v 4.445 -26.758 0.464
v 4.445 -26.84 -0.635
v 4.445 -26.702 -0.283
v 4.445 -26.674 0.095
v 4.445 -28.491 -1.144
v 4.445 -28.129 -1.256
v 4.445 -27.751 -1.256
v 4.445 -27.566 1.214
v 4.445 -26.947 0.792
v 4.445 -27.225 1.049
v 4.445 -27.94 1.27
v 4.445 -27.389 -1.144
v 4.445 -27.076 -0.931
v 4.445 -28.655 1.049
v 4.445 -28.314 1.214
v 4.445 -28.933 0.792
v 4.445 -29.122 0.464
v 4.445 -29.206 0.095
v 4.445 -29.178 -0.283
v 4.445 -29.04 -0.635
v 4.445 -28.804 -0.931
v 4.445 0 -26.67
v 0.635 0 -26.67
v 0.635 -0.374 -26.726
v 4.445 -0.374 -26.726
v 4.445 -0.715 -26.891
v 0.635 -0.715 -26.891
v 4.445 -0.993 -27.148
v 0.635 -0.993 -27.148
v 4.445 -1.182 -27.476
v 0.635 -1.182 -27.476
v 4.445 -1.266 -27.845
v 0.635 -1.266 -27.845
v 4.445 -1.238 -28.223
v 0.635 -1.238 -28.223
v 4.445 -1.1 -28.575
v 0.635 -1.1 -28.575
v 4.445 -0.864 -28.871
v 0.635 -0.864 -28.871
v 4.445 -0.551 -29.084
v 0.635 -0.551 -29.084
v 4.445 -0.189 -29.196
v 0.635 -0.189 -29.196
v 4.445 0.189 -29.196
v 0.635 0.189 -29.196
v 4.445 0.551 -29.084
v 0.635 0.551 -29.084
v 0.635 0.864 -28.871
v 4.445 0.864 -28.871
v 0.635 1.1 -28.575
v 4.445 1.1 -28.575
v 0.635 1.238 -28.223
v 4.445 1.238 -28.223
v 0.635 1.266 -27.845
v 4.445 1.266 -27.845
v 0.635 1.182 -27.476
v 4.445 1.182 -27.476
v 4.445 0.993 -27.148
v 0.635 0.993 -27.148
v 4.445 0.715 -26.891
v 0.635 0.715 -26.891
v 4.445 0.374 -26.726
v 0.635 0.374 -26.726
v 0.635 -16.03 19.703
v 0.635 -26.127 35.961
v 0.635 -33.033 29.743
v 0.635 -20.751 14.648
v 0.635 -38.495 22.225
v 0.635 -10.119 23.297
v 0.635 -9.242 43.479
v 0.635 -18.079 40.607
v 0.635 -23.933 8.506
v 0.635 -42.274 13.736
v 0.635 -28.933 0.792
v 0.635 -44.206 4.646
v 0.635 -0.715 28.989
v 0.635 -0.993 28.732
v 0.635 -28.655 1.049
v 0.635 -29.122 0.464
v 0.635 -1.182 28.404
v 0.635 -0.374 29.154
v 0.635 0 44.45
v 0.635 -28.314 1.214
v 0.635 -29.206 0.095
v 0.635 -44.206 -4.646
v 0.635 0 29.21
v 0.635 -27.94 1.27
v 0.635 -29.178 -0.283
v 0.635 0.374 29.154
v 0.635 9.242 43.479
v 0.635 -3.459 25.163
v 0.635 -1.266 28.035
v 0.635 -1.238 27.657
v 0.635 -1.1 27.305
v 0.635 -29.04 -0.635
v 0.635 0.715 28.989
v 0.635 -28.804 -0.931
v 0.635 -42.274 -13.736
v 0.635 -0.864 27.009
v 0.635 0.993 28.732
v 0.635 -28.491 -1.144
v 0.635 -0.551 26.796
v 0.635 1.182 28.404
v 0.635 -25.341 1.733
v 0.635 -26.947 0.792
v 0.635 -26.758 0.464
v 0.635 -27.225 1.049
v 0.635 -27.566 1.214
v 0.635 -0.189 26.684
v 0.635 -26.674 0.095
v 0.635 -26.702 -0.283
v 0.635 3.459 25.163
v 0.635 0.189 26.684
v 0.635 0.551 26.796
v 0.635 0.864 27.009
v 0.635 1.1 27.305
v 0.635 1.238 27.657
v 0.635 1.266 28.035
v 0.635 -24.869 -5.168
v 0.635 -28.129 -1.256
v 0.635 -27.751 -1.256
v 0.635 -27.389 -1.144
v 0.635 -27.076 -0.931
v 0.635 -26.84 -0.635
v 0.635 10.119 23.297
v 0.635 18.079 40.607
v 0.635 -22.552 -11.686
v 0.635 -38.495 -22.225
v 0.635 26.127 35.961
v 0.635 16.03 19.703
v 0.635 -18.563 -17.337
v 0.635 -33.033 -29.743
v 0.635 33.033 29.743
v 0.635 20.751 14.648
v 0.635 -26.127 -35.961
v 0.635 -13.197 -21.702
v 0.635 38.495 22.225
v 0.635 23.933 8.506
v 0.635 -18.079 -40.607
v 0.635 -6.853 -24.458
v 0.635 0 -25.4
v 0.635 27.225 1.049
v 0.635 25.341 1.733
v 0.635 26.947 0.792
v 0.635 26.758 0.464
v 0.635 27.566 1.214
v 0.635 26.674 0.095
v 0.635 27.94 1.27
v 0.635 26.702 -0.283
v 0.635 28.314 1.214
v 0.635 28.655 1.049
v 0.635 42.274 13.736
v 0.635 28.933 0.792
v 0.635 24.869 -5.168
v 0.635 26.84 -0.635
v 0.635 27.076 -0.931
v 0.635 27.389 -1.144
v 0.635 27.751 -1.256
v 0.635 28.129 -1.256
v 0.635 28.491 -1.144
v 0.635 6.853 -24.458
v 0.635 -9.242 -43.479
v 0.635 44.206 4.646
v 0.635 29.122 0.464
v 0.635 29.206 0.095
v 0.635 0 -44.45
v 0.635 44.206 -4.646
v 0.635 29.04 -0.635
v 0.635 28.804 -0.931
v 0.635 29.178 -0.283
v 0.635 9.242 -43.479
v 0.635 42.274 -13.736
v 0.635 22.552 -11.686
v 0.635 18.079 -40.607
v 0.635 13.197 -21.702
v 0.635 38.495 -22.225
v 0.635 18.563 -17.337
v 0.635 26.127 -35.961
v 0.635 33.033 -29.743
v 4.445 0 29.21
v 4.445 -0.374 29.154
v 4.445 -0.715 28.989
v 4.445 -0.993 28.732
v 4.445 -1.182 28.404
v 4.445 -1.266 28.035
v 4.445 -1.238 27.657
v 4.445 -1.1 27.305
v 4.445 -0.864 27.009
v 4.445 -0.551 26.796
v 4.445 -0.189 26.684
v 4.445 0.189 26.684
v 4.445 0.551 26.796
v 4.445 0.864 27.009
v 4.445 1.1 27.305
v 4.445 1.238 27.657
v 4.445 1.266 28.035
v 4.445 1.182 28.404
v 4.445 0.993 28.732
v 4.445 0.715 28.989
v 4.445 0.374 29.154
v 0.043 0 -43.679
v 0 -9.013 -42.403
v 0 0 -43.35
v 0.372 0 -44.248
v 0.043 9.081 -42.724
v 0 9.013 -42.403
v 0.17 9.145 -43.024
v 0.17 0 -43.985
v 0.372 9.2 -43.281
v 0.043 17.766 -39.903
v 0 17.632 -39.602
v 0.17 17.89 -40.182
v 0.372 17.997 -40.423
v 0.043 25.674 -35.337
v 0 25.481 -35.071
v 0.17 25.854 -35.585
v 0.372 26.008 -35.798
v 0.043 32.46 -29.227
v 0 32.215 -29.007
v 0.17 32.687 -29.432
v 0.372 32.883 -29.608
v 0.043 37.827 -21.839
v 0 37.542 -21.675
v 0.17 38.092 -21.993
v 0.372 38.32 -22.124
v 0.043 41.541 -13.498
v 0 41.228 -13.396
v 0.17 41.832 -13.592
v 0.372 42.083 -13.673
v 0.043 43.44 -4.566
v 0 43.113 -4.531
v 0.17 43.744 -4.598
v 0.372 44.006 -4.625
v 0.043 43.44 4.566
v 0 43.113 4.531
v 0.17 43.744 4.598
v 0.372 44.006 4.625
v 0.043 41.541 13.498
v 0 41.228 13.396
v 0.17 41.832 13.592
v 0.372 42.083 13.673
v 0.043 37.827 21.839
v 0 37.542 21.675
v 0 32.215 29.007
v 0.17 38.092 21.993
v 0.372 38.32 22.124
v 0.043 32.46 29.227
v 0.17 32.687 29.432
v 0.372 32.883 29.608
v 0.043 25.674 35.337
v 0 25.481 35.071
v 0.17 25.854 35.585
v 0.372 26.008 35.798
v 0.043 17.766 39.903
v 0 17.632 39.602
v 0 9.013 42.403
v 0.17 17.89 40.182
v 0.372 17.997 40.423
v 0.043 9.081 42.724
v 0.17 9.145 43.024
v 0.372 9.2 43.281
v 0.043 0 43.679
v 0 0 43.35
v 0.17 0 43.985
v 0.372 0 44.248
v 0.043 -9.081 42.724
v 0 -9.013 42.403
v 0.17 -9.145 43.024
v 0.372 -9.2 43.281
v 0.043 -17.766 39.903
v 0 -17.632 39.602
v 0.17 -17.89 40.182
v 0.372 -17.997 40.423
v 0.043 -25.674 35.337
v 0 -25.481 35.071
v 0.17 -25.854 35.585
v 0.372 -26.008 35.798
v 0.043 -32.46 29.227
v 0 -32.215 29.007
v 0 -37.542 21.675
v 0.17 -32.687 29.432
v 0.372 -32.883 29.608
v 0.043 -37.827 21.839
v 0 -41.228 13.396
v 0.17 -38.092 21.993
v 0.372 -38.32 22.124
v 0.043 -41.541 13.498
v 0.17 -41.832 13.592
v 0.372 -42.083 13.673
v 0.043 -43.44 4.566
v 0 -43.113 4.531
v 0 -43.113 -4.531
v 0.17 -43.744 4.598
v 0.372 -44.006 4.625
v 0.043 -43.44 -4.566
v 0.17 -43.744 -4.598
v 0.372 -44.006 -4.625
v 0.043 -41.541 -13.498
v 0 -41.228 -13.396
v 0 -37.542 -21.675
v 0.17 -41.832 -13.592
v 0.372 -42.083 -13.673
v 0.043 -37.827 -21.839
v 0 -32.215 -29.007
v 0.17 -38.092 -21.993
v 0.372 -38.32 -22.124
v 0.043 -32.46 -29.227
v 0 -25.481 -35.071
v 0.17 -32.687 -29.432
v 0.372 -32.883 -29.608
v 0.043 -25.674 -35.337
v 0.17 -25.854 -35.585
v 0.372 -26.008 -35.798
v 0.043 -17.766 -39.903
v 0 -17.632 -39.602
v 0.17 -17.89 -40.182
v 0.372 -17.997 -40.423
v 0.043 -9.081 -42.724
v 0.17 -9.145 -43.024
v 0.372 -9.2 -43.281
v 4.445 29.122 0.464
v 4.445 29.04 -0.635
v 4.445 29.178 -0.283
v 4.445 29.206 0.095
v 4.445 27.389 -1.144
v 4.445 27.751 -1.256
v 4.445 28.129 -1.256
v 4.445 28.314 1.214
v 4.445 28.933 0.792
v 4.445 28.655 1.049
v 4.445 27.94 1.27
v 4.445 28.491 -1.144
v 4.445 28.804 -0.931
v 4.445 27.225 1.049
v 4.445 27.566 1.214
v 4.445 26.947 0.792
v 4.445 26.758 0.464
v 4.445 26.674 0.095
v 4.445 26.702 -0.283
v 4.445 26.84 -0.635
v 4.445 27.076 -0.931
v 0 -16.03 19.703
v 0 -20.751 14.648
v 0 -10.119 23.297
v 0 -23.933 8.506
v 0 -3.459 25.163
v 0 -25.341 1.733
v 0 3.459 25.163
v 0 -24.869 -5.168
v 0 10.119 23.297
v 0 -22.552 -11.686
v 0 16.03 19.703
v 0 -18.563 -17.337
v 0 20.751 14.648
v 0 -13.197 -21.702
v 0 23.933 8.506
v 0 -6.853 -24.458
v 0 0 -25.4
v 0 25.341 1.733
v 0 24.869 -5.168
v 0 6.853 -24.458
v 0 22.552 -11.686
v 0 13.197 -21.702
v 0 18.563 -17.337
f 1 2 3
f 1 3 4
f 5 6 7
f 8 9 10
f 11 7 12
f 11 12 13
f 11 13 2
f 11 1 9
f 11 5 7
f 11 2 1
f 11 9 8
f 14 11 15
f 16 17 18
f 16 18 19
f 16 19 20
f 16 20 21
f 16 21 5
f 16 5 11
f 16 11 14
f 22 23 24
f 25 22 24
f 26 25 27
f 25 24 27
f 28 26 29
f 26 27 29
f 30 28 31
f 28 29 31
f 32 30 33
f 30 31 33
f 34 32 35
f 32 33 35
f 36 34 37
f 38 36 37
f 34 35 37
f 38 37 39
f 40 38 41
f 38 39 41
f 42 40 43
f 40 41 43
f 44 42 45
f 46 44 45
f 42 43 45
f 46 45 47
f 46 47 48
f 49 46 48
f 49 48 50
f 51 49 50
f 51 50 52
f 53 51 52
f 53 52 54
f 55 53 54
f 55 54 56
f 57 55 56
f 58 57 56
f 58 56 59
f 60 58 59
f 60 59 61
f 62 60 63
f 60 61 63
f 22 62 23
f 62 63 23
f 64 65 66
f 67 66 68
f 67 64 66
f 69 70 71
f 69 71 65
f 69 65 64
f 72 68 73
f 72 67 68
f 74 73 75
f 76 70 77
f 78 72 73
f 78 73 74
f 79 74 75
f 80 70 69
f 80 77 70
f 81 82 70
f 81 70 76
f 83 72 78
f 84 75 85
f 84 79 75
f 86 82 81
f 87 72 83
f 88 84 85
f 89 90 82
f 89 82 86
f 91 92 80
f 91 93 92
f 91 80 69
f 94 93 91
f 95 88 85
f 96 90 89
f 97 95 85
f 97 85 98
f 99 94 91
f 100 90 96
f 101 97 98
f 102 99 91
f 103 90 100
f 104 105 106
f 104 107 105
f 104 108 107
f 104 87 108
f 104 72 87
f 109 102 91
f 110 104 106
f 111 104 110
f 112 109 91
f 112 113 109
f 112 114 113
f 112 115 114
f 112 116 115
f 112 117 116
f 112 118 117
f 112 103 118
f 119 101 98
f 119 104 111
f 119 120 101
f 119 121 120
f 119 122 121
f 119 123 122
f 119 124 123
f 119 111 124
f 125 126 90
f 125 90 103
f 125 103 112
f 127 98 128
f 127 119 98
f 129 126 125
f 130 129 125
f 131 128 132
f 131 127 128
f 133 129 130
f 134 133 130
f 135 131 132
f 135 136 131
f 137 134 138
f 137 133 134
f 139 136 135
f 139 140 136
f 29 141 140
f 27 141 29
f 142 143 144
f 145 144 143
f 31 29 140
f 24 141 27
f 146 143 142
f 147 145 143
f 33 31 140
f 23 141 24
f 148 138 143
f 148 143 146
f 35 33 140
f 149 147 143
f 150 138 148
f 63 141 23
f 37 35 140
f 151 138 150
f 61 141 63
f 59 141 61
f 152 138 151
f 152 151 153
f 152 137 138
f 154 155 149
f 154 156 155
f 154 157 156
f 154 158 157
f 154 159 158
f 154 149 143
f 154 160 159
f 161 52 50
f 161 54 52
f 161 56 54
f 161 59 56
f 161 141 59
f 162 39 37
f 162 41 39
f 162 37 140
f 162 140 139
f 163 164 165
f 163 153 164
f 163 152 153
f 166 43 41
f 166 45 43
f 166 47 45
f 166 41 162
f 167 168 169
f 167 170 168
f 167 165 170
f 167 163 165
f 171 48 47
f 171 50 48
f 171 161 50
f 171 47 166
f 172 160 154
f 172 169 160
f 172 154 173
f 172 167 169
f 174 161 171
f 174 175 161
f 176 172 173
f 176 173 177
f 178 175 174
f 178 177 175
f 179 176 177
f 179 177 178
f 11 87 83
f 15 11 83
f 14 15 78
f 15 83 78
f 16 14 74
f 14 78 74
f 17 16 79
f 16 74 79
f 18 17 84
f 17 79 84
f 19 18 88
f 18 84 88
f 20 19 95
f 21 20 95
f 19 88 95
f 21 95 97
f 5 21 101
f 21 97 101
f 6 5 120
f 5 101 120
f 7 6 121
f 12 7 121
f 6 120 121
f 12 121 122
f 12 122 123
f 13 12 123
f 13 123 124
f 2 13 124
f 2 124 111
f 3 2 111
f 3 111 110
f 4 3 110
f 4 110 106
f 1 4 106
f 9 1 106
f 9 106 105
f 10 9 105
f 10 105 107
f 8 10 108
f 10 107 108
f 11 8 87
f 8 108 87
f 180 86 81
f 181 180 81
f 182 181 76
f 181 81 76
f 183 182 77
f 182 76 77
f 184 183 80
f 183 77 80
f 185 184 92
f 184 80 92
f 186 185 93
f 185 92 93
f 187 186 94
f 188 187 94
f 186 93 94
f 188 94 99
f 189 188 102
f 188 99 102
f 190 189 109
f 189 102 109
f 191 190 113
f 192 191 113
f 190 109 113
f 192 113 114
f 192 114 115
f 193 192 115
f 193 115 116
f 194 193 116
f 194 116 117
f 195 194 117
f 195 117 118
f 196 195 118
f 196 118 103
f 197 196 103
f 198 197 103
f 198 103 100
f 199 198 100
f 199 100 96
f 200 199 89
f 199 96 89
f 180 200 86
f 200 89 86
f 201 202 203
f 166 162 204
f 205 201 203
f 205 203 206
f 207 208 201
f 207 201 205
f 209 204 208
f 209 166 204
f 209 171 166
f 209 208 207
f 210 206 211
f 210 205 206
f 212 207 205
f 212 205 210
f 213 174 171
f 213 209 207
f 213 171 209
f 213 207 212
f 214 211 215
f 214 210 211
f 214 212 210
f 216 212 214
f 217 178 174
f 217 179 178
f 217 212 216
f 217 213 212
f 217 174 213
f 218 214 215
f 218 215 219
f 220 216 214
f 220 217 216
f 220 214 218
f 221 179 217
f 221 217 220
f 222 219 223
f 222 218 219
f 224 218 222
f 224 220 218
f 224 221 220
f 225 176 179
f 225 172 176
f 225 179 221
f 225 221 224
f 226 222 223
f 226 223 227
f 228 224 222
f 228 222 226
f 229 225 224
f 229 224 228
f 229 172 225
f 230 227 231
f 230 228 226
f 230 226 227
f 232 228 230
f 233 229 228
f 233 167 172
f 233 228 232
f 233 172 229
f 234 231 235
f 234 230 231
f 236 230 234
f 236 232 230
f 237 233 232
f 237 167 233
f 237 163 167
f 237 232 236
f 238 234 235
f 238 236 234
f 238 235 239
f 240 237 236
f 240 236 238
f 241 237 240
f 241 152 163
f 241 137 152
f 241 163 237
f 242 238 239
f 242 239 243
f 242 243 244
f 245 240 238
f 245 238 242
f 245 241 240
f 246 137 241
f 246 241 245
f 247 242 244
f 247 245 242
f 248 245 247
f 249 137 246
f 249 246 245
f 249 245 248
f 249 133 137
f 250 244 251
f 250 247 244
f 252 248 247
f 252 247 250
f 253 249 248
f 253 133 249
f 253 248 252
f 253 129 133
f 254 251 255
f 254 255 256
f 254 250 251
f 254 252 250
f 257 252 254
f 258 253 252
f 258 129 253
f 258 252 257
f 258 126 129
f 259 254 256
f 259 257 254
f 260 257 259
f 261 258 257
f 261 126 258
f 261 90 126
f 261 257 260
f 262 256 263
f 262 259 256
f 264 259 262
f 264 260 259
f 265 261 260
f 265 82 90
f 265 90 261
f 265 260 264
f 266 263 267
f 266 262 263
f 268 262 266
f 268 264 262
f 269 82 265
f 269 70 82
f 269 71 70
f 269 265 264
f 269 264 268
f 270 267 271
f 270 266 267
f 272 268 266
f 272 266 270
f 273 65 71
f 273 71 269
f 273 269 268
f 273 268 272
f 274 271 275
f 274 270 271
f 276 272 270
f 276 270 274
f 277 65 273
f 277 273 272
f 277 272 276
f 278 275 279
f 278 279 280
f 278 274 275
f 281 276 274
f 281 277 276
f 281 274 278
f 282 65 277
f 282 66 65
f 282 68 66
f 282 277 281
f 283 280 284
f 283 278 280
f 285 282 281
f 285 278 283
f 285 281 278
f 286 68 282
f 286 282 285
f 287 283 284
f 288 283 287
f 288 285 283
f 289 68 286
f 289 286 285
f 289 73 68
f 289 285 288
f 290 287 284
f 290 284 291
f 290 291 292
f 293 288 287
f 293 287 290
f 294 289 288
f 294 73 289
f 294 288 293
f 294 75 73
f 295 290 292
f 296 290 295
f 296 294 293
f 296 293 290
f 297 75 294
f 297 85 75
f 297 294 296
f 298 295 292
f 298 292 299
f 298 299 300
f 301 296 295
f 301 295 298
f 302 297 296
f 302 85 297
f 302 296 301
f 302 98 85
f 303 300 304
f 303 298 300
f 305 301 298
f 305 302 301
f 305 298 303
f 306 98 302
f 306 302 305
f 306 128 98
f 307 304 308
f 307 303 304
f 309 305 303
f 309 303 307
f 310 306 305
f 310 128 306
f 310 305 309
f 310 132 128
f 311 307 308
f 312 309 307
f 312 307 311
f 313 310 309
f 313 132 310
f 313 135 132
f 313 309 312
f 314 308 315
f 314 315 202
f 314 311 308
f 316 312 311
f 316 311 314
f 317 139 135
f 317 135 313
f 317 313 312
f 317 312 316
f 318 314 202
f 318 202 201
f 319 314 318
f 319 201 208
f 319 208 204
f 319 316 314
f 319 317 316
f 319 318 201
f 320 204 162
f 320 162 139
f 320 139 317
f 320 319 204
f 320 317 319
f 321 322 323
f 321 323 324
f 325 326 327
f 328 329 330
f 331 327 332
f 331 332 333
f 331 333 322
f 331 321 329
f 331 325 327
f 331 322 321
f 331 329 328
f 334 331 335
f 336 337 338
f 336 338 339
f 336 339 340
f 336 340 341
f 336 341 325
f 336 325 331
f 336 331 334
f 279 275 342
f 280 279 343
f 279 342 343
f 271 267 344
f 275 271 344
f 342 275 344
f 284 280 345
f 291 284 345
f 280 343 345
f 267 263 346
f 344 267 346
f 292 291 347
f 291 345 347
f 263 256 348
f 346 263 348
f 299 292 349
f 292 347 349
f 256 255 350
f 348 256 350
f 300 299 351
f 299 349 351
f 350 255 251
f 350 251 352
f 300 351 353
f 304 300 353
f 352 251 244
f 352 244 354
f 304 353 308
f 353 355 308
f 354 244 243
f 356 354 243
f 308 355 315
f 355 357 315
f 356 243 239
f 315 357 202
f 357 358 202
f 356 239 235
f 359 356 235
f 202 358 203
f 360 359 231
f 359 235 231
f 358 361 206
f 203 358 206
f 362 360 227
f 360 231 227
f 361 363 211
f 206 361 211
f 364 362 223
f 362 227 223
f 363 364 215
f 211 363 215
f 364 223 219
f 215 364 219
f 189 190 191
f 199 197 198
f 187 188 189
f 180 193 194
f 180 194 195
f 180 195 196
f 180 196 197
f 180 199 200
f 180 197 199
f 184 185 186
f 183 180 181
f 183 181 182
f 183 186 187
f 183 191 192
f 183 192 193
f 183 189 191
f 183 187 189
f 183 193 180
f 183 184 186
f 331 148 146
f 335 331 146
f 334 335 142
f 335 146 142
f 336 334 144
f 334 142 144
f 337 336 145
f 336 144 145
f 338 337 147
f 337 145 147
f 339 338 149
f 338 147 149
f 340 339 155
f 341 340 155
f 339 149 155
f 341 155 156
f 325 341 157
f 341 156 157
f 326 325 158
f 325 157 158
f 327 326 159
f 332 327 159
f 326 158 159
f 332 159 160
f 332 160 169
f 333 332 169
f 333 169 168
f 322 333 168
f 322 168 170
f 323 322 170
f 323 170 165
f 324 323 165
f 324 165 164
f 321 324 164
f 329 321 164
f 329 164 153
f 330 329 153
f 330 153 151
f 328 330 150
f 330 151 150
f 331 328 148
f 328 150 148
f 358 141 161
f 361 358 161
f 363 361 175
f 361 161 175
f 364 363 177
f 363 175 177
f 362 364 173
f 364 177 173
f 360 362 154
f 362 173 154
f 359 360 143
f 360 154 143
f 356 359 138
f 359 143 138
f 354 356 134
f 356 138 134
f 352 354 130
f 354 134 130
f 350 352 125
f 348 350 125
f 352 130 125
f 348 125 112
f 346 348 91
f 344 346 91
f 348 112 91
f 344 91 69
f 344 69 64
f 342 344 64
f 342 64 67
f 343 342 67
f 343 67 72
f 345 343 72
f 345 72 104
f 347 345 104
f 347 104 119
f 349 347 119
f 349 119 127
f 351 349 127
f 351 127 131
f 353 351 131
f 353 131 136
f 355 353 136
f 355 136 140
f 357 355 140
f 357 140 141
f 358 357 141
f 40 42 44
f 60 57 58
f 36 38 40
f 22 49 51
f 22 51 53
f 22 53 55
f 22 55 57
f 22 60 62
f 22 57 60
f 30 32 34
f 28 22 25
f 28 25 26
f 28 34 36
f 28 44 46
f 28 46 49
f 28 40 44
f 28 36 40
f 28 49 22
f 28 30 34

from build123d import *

# Parameters (mm, degrees)
SKETCH1_R           = 44.45
BOSS_EXTRUDE1_DEPTH = 0.635
SKETCH2_R           = 1.27
BOSS_EXTRUDE2_DEPTH = 3.81
CUT_EXTRUDE1_REACH  = 64.977
SKETCH3_R           = 25.4
FILLET1_R           = 1.27


with BuildPart() as part:
    # Sketch1 → Boss-Extrude1 (new body)
    with BuildSketch(Plane(origin=(0, 0, 0), x_dir=(0, 0, -1), z_dir=(1, 0, 0))):
        Circle(SKETCH1_R)
    extrude(amount=BOSS_EXTRUDE1_DEPTH)

    # Sketch2 → Boss-Extrude2 (add)
    with BuildSketch(Plane(origin=(0.635, 0, 0), x_dir=(0, 0, -1), z_dir=(1, 0, 0))):
        with Locations(Location((0, 27.94, 0), (0, 0, 180))):
            Circle(SKETCH2_R)
        with Locations(Location((27.94, 0, 0), (0, 0, 180))):
            Circle(SKETCH2_R)
        with Locations(Location((0, -27.94, 0), (0, 0, 180))):
            Circle(SKETCH2_R)
        with Locations(Location((-27.94, 0, 0), (0, 0, 180))):
            Circle(SKETCH2_R)
    extrude(amount=BOSS_EXTRUDE2_DEPTH)

    # Sketch3 → Cut-Extrude1 (cut, up to next)
    with BuildSketch(Plane(origin=(0.635, 0, 0), x_dir=(0, 0, -1), z_dir=(1, 0, 0)), mode=Mode.PRIVATE) as cut_extrude1_sk1:
        Circle(SKETCH3_R)
    cut_extrude1_tool1 = extrude(cut_extrude1_sk1.sketch, amount=-CUT_EXTRUDE1_REACH, mode=Mode.PRIVATE) & part.part
    add(cut_extrude1_tool1.solids().sort_by_distance((0.635, 0, 0))[0], mode=Mode.SUBTRACT)

    # Fillet1
    # the kernel refuses this fillet: 1.27 mm, written as the material it takes off along each edge
    with BuildSketch(Plane(origin=(0, 0, 0), x_dir=(0, 0, -1), z_dir=(0, -1, 0))) as fillet1_piece_1:
        with BuildLine():
            CenterArc((43.350147737, 1.27), FILLET1_R, 270, 60)
            Line((43.350147737, 0), (43.350147737, -0.0254))
            Line((43.350147737, -0.0254), (44.45, -0.0254))
            Line((44.45, -0.0254), (44.4754, 0))
            ThreePointArc((44.4754, 0), (44.4754, 0.3175), (44.471997045, 0.6223))
            Line((44.471997045, 0.6223), (44.45, 0.635))
        make_face()
    revolve(axis=Axis((0, 0, 0), (1, 0, 0)), mode=Mode.SUBTRACT)


solid = part.part
